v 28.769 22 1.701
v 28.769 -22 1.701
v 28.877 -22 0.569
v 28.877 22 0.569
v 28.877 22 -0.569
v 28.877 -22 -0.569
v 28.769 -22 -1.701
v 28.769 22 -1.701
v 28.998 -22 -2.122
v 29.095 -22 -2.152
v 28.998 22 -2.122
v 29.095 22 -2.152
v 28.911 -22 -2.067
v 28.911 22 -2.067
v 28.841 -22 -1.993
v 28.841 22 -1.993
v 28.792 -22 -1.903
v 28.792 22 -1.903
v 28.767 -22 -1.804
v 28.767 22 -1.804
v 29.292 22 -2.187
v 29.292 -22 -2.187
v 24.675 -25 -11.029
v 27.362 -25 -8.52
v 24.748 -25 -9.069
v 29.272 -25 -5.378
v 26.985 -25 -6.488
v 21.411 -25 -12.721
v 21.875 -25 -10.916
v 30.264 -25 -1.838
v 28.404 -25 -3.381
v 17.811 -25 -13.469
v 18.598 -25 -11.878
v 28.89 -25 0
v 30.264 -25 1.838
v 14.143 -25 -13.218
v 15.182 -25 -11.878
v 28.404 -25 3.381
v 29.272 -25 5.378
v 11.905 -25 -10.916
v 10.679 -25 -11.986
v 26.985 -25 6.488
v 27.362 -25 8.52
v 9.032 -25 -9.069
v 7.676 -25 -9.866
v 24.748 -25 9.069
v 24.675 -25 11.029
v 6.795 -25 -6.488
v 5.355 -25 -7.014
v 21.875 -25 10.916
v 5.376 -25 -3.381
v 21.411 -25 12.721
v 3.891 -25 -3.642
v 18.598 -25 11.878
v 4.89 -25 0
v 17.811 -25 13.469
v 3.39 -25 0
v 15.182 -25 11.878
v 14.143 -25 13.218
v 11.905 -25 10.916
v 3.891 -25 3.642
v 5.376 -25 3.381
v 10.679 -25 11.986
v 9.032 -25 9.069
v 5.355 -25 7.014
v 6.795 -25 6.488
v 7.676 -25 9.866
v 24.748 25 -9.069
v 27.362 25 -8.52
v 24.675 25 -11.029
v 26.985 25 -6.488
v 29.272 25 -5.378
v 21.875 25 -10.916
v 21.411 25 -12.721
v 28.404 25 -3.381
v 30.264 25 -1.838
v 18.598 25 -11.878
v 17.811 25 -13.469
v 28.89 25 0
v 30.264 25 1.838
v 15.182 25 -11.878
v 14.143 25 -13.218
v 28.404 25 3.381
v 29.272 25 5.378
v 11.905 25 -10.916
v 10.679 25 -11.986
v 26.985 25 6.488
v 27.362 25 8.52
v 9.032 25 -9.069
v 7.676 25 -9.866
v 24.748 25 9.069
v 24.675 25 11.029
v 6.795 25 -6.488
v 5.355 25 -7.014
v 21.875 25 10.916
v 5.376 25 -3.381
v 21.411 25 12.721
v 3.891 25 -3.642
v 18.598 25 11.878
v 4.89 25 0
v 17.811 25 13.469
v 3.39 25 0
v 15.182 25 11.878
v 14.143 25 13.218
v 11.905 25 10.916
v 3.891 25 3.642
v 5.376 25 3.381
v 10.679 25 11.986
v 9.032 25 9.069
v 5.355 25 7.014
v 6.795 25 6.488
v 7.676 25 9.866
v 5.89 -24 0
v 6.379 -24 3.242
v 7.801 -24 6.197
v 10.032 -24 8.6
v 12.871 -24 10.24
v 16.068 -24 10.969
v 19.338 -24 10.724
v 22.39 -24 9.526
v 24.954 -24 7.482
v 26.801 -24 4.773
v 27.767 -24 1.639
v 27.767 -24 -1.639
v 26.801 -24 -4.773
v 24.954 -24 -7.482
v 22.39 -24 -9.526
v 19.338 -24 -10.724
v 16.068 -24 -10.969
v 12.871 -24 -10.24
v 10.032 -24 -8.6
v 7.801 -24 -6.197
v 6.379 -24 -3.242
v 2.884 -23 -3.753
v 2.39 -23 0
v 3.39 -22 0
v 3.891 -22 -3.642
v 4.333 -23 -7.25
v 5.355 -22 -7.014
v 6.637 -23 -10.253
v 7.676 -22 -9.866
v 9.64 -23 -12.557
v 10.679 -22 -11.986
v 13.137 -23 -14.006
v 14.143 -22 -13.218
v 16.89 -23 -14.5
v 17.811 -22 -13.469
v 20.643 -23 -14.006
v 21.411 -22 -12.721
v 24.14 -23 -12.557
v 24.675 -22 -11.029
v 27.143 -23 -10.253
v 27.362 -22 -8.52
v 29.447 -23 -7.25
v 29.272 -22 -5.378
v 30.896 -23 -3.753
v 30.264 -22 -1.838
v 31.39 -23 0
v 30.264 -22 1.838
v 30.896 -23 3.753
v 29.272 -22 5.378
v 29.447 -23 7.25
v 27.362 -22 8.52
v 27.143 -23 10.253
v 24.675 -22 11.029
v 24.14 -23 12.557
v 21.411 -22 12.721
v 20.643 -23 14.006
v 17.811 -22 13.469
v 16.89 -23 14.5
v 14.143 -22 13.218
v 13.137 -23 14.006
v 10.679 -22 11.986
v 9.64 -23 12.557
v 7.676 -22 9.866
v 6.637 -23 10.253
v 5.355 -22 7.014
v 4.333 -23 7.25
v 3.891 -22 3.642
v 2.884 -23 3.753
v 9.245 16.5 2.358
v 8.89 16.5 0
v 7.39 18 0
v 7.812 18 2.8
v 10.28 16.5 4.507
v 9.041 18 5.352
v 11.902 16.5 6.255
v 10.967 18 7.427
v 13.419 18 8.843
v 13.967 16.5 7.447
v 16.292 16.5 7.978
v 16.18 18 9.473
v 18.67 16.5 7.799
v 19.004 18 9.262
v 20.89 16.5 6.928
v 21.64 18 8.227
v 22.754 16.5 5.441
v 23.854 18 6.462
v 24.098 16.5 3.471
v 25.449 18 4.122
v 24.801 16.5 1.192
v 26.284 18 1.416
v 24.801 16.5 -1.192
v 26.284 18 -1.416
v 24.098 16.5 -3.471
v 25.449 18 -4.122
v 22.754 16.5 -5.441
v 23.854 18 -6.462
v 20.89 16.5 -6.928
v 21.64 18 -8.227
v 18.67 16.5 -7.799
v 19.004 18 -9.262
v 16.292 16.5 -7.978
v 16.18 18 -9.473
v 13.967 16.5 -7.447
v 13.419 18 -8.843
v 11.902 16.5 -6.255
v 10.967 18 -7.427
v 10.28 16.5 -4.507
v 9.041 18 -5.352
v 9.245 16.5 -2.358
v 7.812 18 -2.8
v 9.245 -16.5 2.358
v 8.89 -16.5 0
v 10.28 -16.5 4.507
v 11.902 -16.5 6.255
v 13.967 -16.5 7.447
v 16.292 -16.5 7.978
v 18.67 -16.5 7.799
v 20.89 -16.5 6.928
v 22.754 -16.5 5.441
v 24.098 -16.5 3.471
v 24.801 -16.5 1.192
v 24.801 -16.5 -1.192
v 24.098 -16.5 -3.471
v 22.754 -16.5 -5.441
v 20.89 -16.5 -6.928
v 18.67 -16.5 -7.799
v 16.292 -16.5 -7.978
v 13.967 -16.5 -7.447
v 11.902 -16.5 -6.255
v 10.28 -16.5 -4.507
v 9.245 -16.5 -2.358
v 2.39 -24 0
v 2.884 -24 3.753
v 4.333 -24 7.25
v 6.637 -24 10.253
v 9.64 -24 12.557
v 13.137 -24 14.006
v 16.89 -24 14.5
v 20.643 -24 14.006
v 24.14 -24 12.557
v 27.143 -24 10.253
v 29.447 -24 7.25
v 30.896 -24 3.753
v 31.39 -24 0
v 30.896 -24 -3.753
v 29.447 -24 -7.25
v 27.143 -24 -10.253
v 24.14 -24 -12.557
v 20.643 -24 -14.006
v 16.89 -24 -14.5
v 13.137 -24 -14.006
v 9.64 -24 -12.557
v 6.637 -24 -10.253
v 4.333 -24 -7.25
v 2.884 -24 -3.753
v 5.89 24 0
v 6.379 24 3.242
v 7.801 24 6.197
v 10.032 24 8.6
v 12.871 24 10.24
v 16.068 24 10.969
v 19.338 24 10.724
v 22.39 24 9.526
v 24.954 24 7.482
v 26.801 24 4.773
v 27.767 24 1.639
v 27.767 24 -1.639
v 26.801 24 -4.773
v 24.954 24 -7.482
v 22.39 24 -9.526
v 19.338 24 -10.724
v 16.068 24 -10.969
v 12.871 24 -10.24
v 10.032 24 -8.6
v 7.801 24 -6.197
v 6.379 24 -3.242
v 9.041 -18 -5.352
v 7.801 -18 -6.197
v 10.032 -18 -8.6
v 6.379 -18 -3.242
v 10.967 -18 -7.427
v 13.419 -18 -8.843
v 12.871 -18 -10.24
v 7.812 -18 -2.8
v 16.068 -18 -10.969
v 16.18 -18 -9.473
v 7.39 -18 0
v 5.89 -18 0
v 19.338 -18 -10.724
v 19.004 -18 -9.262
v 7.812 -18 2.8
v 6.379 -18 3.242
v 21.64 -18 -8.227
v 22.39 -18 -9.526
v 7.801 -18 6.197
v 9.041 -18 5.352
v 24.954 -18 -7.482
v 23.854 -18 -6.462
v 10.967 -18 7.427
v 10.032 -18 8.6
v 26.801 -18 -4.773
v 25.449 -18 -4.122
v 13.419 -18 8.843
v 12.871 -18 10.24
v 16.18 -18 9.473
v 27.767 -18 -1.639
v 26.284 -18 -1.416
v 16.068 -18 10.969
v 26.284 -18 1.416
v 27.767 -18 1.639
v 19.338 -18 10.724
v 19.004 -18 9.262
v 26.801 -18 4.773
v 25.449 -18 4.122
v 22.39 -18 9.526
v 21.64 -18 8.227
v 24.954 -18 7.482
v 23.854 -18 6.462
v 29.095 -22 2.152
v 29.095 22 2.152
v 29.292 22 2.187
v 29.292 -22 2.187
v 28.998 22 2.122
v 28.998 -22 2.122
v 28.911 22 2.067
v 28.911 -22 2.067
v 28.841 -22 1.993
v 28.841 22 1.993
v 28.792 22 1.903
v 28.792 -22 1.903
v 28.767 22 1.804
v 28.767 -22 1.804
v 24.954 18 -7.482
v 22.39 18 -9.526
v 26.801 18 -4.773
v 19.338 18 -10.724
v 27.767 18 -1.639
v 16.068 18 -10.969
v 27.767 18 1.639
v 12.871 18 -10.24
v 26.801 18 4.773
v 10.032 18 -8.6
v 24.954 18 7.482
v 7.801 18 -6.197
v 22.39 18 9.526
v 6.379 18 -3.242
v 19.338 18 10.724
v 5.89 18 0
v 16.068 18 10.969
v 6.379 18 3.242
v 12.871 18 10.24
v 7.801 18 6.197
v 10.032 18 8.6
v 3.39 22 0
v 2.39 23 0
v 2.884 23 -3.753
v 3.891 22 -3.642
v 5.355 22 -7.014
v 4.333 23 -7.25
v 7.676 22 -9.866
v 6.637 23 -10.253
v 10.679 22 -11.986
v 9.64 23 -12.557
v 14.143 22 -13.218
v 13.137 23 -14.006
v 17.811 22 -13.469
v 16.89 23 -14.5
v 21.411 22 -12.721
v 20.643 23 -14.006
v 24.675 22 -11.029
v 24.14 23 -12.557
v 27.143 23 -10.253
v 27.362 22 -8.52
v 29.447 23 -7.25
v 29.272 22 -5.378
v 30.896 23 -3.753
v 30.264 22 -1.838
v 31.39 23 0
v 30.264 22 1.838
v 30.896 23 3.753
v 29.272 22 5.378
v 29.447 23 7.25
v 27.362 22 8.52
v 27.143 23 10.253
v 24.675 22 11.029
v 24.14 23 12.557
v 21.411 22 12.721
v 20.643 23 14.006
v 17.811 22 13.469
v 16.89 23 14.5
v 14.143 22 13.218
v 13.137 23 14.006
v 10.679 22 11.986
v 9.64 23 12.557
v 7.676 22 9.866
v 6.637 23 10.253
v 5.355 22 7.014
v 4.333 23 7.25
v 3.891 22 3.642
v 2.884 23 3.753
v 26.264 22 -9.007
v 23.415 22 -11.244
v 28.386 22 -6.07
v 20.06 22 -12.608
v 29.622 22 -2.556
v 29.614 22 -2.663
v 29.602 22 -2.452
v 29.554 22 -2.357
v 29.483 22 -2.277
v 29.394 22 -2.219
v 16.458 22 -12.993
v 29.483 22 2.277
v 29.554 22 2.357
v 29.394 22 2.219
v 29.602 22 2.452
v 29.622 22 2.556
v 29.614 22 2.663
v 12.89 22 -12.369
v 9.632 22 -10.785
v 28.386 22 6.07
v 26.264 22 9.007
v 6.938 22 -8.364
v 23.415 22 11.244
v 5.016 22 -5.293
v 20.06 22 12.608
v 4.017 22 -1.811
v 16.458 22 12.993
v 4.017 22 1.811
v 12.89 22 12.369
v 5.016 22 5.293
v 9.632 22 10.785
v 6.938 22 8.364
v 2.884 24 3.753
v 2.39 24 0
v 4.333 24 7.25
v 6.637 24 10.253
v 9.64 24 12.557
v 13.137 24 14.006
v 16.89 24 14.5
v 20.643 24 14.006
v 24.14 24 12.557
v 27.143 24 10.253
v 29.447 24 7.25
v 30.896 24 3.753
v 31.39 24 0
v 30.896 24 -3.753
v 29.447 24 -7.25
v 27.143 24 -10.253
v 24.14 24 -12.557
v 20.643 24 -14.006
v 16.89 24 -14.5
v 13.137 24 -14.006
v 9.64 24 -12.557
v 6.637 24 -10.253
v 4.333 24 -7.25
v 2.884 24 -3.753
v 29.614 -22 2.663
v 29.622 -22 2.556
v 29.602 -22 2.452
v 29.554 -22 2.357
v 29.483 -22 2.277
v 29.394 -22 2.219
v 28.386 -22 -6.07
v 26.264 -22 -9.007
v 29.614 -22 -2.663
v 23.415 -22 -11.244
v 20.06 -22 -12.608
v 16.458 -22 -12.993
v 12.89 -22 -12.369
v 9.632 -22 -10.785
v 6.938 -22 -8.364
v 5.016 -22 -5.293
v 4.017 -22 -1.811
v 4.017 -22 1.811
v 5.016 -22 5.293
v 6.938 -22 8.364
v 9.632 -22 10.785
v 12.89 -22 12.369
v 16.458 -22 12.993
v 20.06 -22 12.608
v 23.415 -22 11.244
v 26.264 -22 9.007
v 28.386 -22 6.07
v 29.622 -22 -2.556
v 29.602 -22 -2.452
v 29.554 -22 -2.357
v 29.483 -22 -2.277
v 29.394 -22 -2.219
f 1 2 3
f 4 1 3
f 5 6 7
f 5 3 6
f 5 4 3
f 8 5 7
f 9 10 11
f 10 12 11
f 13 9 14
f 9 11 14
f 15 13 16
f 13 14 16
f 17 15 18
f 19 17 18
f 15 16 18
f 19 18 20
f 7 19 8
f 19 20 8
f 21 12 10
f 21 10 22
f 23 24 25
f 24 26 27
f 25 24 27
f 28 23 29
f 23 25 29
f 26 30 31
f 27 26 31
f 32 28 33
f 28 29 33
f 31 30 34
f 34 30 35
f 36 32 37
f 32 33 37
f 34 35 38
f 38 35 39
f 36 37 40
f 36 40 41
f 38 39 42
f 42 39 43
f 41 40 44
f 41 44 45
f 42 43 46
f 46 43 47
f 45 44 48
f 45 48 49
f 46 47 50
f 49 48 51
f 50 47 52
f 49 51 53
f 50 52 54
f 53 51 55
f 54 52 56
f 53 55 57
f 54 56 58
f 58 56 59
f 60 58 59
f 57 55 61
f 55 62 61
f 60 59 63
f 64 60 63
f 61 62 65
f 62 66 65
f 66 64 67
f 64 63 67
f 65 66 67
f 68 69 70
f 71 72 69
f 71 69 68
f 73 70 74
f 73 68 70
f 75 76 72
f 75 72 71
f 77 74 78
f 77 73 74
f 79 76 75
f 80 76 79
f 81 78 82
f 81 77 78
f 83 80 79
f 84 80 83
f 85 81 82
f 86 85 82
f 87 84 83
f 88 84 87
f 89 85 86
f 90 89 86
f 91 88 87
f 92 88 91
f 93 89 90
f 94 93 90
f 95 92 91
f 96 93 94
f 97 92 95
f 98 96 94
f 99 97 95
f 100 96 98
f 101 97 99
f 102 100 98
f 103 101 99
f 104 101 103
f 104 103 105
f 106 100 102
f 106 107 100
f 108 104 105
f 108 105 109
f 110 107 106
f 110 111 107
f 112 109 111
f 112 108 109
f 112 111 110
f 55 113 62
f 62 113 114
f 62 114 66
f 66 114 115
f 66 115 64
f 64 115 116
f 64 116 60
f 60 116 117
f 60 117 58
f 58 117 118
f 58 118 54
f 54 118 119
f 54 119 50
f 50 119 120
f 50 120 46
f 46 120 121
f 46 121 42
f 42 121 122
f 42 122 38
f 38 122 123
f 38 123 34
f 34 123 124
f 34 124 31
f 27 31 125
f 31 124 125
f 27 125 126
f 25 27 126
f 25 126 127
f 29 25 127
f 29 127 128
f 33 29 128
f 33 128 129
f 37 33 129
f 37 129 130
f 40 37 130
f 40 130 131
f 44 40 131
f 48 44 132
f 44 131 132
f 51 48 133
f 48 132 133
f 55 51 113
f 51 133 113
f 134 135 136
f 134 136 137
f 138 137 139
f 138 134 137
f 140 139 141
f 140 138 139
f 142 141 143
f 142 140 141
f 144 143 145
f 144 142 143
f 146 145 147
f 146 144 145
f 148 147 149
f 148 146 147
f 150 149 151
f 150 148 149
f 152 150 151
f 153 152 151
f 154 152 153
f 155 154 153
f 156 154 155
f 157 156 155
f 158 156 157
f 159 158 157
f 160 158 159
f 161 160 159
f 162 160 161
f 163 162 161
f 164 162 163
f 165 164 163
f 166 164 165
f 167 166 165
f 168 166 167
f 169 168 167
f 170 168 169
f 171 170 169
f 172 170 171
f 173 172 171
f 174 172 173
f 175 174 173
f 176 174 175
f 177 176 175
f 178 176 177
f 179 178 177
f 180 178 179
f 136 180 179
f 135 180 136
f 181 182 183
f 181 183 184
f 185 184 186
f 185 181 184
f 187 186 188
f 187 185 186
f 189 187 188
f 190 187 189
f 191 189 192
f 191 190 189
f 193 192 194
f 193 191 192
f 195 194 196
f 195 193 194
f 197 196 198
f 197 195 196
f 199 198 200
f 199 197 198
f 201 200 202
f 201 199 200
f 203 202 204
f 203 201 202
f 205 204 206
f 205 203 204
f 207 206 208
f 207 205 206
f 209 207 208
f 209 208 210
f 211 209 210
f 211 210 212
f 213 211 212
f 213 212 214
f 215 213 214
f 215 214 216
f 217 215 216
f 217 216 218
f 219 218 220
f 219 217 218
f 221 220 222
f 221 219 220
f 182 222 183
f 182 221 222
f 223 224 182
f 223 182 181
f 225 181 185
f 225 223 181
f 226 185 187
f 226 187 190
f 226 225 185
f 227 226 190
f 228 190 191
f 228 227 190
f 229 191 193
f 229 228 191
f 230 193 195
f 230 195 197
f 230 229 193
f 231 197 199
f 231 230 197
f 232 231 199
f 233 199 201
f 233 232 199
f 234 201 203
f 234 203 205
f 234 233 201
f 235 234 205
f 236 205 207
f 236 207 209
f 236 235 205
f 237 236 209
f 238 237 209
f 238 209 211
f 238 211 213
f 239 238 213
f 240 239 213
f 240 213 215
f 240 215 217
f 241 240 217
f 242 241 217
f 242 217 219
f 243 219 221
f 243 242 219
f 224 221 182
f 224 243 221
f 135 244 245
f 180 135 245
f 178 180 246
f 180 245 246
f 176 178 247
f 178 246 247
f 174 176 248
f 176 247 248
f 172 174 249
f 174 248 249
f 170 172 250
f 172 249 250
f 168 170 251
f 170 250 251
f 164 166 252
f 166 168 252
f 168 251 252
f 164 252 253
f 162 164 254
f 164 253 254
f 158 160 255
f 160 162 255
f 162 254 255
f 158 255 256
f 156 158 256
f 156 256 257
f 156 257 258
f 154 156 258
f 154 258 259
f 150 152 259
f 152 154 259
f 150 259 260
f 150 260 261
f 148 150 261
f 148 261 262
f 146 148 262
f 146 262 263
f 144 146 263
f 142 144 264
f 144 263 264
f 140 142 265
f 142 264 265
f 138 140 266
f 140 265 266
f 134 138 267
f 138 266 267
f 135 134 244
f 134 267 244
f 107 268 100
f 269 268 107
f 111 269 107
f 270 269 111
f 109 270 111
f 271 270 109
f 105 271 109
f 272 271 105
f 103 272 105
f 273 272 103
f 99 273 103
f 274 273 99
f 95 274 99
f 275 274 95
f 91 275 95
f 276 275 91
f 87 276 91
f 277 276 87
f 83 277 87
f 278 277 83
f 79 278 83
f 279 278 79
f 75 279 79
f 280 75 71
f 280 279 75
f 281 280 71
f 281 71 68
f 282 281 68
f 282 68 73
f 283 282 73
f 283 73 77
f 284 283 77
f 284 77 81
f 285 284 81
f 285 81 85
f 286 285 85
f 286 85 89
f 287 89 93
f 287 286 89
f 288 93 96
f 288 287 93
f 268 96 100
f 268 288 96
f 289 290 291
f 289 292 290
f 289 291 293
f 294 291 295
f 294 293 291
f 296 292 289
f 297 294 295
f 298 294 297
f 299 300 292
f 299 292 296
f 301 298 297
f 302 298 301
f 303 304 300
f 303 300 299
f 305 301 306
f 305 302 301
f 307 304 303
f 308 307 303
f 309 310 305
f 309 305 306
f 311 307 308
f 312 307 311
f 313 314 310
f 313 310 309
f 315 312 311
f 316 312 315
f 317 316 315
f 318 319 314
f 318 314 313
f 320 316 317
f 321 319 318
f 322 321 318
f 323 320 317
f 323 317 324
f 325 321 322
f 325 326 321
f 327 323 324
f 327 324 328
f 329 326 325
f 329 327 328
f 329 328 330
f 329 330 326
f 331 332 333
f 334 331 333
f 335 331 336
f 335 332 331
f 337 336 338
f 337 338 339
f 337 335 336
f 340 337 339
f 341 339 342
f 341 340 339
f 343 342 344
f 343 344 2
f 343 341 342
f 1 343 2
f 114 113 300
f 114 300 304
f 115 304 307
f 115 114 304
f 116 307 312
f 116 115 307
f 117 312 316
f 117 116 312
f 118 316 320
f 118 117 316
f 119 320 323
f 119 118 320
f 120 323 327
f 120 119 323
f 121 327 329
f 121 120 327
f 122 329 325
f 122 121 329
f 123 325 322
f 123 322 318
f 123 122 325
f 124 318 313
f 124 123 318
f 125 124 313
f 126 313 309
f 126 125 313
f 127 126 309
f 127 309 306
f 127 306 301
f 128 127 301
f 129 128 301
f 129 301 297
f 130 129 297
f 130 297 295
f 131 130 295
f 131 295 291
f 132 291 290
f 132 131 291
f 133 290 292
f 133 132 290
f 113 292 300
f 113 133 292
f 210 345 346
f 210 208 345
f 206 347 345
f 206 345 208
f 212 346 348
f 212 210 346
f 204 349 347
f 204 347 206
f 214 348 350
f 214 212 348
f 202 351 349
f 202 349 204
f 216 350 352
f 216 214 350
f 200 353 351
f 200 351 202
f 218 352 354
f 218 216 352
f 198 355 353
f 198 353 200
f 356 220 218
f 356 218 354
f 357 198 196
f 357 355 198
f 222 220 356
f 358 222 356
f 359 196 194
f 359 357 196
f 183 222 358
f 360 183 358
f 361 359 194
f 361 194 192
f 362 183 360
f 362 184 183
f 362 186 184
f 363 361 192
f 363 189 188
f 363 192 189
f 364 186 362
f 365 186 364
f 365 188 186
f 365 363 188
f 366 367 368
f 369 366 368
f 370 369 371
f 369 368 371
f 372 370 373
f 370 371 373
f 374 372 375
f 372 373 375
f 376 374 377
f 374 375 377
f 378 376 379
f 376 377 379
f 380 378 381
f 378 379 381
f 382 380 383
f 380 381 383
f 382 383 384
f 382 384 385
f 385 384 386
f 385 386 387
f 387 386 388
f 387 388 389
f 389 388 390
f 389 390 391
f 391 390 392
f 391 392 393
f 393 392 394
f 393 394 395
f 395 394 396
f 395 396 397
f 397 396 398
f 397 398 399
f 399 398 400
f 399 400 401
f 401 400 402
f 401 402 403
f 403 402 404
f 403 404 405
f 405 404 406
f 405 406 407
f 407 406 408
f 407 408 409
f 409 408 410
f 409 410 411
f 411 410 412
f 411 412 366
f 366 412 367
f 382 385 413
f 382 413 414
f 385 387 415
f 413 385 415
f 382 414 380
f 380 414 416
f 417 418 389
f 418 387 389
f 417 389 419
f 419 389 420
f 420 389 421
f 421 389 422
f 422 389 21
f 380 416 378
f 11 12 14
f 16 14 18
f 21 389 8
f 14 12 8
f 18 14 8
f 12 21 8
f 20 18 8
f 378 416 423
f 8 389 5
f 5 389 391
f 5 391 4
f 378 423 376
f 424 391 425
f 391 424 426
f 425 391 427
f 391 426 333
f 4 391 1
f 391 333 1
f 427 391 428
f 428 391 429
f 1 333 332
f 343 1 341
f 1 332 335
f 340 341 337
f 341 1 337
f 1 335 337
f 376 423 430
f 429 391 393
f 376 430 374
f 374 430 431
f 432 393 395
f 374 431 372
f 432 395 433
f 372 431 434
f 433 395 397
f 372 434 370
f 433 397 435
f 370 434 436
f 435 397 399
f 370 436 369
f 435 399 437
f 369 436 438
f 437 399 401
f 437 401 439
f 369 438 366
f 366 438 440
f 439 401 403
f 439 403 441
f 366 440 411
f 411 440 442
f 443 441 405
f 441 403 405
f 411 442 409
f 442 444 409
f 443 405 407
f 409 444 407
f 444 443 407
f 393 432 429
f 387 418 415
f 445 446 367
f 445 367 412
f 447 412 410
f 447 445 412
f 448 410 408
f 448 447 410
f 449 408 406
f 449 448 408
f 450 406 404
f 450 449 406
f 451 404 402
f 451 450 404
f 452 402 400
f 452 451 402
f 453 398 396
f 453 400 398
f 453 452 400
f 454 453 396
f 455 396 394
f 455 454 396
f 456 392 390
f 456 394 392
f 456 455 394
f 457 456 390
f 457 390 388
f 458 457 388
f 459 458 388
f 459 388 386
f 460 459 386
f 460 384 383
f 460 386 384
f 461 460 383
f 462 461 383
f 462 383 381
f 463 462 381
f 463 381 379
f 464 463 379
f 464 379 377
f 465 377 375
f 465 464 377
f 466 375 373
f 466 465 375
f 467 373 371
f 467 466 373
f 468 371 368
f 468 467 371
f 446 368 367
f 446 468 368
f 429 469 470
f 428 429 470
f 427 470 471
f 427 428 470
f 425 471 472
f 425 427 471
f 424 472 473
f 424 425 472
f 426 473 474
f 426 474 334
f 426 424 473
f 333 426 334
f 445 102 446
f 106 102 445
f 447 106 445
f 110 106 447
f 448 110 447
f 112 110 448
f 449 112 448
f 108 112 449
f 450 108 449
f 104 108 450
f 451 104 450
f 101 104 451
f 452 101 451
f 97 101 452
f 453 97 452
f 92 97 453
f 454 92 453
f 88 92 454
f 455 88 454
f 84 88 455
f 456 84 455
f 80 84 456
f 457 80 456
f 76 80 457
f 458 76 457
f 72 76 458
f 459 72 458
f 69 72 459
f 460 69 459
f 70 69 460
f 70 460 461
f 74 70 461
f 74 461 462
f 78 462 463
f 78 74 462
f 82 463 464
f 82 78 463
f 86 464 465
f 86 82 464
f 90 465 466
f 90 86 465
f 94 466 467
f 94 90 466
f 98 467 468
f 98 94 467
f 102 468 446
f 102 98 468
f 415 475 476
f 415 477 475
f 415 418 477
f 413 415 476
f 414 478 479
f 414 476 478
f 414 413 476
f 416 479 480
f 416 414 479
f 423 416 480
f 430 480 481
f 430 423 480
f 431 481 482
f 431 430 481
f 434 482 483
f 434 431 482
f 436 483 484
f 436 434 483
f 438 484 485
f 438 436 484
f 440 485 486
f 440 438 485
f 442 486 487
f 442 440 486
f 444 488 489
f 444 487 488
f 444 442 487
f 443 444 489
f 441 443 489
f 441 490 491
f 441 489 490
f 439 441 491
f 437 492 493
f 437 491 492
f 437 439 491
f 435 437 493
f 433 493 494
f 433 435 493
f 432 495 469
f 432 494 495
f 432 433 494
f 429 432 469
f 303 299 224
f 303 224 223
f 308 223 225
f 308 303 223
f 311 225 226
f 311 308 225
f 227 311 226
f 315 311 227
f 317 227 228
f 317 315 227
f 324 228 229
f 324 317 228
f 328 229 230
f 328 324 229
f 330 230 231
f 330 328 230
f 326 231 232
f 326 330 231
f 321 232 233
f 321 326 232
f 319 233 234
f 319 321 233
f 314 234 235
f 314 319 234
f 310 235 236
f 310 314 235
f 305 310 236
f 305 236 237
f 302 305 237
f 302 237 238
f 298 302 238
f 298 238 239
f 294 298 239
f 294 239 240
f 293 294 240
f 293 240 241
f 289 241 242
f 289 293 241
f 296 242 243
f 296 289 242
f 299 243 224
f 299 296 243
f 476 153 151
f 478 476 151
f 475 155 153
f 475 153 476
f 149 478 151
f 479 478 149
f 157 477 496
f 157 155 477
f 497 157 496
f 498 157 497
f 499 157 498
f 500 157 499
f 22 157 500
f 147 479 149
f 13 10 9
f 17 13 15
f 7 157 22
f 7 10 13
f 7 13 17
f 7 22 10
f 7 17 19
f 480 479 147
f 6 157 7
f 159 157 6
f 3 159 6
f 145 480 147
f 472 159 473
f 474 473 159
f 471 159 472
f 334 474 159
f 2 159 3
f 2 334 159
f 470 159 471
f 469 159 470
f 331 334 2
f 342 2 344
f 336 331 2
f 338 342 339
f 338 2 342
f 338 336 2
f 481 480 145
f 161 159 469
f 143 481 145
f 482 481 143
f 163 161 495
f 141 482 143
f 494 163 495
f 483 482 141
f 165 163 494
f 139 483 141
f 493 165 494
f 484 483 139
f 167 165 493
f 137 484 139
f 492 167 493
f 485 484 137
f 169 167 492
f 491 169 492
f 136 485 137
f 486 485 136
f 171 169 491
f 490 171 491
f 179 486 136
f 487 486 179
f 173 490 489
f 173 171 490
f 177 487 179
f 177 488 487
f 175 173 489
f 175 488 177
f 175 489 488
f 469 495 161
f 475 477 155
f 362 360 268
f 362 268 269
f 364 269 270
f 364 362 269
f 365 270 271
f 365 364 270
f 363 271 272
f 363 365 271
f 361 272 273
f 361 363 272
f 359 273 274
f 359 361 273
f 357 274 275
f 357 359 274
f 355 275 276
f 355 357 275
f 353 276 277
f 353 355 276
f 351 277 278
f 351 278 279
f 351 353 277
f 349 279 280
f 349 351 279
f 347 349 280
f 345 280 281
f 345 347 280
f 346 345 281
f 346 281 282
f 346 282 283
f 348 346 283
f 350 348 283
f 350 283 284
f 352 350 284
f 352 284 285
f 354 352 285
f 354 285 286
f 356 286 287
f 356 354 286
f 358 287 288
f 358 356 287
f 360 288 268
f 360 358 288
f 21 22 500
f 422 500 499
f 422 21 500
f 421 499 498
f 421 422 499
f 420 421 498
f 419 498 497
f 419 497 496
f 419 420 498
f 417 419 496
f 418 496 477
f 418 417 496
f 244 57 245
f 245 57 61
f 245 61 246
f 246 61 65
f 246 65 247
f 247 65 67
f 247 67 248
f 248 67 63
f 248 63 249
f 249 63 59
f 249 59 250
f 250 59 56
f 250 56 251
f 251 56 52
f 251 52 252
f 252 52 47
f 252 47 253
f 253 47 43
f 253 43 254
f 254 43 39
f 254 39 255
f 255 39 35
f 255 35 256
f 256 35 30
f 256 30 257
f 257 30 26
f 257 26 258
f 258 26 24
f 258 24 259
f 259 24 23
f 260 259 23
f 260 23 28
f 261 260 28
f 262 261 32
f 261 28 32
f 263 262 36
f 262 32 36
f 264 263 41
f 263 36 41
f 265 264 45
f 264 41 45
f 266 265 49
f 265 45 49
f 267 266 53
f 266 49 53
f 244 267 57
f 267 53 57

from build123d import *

# Parameters (mm, degrees)
CHAMFER_SIZE    = 1.5
SKETCH001_W     = 1.5
SKETCH001_H     = 3
SKETCH002_W     = 3
SKETCH002_H     = 44
GROOVE_ANGLE    = 20
FILLET_R        = 0.4
CHAMFER002_SIZE = 1


with BuildPart() as part:
    # Sketch → Revolution (revolve)
    with BuildSketch(Plane.XY):
        Polygon((-13, -25), (-13, 25), (-11, 25), (-11, 18), (-8, 18), (-8, -18), (-11, -18), (-11, -25), align=None)
    revolve(axis=Axis((0, 0, 0), (0, 1, 0)))

    # Chamfer
    chamfer_edges = [part.edges().sort_by_distance(p)[0] for p in [
        (8, -18, 0),
        (8, 18, 0),
    ]]
    chamfer(chamfer_edges, length=CHAMFER_SIZE)

    # Sketch001 → Revolution001 (revolve)
    with BuildSketch(Plane.XY):
        with Locations((-13.75, 23.5)):
            Rectangle(SKETCH001_W, SKETCH001_H)
    revolution001 = revolve(axis=Axis((0, 0, 0), (0, 1, 0)))

    # Mirrored: Revolution001 across XZ
    add(revolution001.mirror(Plane.XZ))

    # Sketch002 → Groove (revolve, symmetric, cut)
    with BuildSketch(Plane.XY) as groove_sk:
        with Locations((13.5, 0)):
            Rectangle(SKETCH002_W, SKETCH002_H)
    revolve(axis=Axis((0, 0, 0), (0, 1, 0)), revolution_arc=GROOVE_ANGLE / 2, mode=Mode.SUBTRACT)
    revolve(groove_sk.sketch, axis=Axis((0, 0, 0), (0, -1, 0)), revolution_arc=GROOVE_ANGLE / 2, mode=Mode.SUBTRACT)

    # Fillet
    fillet_edges = [part.edges().sort_by_distance(p)[0] for p in [
        (12.802501, 0, 2.257426),
        (12.802501, 0, -2.257426),
        (11.817693, 0, -2.083778),
        (11.817693, 0, 2.083778),
    ]]
    fillet(fillet_edges, radius=FILLET_R)

    # Chamfer002
    chamfer002_edges = [part.edges().sort_by_distance(p)[0] for p in [
        (14.5, 25, 0),
        (14.5, -25, 0),
        (11, 25, 0),
        (11, -25, 0),
        (-1.263758, 22, 14.444823),
        (-1.263758, -22, 14.444823),
    ]]
    chamfer(chamfer002_edges, length=CHAMFER002_SIZE)


with BuildPart() as part_1:
    # Body placement: moved
    add(part.part.moved(Location((16.89, 0, 0))))


solid = part_1.part
